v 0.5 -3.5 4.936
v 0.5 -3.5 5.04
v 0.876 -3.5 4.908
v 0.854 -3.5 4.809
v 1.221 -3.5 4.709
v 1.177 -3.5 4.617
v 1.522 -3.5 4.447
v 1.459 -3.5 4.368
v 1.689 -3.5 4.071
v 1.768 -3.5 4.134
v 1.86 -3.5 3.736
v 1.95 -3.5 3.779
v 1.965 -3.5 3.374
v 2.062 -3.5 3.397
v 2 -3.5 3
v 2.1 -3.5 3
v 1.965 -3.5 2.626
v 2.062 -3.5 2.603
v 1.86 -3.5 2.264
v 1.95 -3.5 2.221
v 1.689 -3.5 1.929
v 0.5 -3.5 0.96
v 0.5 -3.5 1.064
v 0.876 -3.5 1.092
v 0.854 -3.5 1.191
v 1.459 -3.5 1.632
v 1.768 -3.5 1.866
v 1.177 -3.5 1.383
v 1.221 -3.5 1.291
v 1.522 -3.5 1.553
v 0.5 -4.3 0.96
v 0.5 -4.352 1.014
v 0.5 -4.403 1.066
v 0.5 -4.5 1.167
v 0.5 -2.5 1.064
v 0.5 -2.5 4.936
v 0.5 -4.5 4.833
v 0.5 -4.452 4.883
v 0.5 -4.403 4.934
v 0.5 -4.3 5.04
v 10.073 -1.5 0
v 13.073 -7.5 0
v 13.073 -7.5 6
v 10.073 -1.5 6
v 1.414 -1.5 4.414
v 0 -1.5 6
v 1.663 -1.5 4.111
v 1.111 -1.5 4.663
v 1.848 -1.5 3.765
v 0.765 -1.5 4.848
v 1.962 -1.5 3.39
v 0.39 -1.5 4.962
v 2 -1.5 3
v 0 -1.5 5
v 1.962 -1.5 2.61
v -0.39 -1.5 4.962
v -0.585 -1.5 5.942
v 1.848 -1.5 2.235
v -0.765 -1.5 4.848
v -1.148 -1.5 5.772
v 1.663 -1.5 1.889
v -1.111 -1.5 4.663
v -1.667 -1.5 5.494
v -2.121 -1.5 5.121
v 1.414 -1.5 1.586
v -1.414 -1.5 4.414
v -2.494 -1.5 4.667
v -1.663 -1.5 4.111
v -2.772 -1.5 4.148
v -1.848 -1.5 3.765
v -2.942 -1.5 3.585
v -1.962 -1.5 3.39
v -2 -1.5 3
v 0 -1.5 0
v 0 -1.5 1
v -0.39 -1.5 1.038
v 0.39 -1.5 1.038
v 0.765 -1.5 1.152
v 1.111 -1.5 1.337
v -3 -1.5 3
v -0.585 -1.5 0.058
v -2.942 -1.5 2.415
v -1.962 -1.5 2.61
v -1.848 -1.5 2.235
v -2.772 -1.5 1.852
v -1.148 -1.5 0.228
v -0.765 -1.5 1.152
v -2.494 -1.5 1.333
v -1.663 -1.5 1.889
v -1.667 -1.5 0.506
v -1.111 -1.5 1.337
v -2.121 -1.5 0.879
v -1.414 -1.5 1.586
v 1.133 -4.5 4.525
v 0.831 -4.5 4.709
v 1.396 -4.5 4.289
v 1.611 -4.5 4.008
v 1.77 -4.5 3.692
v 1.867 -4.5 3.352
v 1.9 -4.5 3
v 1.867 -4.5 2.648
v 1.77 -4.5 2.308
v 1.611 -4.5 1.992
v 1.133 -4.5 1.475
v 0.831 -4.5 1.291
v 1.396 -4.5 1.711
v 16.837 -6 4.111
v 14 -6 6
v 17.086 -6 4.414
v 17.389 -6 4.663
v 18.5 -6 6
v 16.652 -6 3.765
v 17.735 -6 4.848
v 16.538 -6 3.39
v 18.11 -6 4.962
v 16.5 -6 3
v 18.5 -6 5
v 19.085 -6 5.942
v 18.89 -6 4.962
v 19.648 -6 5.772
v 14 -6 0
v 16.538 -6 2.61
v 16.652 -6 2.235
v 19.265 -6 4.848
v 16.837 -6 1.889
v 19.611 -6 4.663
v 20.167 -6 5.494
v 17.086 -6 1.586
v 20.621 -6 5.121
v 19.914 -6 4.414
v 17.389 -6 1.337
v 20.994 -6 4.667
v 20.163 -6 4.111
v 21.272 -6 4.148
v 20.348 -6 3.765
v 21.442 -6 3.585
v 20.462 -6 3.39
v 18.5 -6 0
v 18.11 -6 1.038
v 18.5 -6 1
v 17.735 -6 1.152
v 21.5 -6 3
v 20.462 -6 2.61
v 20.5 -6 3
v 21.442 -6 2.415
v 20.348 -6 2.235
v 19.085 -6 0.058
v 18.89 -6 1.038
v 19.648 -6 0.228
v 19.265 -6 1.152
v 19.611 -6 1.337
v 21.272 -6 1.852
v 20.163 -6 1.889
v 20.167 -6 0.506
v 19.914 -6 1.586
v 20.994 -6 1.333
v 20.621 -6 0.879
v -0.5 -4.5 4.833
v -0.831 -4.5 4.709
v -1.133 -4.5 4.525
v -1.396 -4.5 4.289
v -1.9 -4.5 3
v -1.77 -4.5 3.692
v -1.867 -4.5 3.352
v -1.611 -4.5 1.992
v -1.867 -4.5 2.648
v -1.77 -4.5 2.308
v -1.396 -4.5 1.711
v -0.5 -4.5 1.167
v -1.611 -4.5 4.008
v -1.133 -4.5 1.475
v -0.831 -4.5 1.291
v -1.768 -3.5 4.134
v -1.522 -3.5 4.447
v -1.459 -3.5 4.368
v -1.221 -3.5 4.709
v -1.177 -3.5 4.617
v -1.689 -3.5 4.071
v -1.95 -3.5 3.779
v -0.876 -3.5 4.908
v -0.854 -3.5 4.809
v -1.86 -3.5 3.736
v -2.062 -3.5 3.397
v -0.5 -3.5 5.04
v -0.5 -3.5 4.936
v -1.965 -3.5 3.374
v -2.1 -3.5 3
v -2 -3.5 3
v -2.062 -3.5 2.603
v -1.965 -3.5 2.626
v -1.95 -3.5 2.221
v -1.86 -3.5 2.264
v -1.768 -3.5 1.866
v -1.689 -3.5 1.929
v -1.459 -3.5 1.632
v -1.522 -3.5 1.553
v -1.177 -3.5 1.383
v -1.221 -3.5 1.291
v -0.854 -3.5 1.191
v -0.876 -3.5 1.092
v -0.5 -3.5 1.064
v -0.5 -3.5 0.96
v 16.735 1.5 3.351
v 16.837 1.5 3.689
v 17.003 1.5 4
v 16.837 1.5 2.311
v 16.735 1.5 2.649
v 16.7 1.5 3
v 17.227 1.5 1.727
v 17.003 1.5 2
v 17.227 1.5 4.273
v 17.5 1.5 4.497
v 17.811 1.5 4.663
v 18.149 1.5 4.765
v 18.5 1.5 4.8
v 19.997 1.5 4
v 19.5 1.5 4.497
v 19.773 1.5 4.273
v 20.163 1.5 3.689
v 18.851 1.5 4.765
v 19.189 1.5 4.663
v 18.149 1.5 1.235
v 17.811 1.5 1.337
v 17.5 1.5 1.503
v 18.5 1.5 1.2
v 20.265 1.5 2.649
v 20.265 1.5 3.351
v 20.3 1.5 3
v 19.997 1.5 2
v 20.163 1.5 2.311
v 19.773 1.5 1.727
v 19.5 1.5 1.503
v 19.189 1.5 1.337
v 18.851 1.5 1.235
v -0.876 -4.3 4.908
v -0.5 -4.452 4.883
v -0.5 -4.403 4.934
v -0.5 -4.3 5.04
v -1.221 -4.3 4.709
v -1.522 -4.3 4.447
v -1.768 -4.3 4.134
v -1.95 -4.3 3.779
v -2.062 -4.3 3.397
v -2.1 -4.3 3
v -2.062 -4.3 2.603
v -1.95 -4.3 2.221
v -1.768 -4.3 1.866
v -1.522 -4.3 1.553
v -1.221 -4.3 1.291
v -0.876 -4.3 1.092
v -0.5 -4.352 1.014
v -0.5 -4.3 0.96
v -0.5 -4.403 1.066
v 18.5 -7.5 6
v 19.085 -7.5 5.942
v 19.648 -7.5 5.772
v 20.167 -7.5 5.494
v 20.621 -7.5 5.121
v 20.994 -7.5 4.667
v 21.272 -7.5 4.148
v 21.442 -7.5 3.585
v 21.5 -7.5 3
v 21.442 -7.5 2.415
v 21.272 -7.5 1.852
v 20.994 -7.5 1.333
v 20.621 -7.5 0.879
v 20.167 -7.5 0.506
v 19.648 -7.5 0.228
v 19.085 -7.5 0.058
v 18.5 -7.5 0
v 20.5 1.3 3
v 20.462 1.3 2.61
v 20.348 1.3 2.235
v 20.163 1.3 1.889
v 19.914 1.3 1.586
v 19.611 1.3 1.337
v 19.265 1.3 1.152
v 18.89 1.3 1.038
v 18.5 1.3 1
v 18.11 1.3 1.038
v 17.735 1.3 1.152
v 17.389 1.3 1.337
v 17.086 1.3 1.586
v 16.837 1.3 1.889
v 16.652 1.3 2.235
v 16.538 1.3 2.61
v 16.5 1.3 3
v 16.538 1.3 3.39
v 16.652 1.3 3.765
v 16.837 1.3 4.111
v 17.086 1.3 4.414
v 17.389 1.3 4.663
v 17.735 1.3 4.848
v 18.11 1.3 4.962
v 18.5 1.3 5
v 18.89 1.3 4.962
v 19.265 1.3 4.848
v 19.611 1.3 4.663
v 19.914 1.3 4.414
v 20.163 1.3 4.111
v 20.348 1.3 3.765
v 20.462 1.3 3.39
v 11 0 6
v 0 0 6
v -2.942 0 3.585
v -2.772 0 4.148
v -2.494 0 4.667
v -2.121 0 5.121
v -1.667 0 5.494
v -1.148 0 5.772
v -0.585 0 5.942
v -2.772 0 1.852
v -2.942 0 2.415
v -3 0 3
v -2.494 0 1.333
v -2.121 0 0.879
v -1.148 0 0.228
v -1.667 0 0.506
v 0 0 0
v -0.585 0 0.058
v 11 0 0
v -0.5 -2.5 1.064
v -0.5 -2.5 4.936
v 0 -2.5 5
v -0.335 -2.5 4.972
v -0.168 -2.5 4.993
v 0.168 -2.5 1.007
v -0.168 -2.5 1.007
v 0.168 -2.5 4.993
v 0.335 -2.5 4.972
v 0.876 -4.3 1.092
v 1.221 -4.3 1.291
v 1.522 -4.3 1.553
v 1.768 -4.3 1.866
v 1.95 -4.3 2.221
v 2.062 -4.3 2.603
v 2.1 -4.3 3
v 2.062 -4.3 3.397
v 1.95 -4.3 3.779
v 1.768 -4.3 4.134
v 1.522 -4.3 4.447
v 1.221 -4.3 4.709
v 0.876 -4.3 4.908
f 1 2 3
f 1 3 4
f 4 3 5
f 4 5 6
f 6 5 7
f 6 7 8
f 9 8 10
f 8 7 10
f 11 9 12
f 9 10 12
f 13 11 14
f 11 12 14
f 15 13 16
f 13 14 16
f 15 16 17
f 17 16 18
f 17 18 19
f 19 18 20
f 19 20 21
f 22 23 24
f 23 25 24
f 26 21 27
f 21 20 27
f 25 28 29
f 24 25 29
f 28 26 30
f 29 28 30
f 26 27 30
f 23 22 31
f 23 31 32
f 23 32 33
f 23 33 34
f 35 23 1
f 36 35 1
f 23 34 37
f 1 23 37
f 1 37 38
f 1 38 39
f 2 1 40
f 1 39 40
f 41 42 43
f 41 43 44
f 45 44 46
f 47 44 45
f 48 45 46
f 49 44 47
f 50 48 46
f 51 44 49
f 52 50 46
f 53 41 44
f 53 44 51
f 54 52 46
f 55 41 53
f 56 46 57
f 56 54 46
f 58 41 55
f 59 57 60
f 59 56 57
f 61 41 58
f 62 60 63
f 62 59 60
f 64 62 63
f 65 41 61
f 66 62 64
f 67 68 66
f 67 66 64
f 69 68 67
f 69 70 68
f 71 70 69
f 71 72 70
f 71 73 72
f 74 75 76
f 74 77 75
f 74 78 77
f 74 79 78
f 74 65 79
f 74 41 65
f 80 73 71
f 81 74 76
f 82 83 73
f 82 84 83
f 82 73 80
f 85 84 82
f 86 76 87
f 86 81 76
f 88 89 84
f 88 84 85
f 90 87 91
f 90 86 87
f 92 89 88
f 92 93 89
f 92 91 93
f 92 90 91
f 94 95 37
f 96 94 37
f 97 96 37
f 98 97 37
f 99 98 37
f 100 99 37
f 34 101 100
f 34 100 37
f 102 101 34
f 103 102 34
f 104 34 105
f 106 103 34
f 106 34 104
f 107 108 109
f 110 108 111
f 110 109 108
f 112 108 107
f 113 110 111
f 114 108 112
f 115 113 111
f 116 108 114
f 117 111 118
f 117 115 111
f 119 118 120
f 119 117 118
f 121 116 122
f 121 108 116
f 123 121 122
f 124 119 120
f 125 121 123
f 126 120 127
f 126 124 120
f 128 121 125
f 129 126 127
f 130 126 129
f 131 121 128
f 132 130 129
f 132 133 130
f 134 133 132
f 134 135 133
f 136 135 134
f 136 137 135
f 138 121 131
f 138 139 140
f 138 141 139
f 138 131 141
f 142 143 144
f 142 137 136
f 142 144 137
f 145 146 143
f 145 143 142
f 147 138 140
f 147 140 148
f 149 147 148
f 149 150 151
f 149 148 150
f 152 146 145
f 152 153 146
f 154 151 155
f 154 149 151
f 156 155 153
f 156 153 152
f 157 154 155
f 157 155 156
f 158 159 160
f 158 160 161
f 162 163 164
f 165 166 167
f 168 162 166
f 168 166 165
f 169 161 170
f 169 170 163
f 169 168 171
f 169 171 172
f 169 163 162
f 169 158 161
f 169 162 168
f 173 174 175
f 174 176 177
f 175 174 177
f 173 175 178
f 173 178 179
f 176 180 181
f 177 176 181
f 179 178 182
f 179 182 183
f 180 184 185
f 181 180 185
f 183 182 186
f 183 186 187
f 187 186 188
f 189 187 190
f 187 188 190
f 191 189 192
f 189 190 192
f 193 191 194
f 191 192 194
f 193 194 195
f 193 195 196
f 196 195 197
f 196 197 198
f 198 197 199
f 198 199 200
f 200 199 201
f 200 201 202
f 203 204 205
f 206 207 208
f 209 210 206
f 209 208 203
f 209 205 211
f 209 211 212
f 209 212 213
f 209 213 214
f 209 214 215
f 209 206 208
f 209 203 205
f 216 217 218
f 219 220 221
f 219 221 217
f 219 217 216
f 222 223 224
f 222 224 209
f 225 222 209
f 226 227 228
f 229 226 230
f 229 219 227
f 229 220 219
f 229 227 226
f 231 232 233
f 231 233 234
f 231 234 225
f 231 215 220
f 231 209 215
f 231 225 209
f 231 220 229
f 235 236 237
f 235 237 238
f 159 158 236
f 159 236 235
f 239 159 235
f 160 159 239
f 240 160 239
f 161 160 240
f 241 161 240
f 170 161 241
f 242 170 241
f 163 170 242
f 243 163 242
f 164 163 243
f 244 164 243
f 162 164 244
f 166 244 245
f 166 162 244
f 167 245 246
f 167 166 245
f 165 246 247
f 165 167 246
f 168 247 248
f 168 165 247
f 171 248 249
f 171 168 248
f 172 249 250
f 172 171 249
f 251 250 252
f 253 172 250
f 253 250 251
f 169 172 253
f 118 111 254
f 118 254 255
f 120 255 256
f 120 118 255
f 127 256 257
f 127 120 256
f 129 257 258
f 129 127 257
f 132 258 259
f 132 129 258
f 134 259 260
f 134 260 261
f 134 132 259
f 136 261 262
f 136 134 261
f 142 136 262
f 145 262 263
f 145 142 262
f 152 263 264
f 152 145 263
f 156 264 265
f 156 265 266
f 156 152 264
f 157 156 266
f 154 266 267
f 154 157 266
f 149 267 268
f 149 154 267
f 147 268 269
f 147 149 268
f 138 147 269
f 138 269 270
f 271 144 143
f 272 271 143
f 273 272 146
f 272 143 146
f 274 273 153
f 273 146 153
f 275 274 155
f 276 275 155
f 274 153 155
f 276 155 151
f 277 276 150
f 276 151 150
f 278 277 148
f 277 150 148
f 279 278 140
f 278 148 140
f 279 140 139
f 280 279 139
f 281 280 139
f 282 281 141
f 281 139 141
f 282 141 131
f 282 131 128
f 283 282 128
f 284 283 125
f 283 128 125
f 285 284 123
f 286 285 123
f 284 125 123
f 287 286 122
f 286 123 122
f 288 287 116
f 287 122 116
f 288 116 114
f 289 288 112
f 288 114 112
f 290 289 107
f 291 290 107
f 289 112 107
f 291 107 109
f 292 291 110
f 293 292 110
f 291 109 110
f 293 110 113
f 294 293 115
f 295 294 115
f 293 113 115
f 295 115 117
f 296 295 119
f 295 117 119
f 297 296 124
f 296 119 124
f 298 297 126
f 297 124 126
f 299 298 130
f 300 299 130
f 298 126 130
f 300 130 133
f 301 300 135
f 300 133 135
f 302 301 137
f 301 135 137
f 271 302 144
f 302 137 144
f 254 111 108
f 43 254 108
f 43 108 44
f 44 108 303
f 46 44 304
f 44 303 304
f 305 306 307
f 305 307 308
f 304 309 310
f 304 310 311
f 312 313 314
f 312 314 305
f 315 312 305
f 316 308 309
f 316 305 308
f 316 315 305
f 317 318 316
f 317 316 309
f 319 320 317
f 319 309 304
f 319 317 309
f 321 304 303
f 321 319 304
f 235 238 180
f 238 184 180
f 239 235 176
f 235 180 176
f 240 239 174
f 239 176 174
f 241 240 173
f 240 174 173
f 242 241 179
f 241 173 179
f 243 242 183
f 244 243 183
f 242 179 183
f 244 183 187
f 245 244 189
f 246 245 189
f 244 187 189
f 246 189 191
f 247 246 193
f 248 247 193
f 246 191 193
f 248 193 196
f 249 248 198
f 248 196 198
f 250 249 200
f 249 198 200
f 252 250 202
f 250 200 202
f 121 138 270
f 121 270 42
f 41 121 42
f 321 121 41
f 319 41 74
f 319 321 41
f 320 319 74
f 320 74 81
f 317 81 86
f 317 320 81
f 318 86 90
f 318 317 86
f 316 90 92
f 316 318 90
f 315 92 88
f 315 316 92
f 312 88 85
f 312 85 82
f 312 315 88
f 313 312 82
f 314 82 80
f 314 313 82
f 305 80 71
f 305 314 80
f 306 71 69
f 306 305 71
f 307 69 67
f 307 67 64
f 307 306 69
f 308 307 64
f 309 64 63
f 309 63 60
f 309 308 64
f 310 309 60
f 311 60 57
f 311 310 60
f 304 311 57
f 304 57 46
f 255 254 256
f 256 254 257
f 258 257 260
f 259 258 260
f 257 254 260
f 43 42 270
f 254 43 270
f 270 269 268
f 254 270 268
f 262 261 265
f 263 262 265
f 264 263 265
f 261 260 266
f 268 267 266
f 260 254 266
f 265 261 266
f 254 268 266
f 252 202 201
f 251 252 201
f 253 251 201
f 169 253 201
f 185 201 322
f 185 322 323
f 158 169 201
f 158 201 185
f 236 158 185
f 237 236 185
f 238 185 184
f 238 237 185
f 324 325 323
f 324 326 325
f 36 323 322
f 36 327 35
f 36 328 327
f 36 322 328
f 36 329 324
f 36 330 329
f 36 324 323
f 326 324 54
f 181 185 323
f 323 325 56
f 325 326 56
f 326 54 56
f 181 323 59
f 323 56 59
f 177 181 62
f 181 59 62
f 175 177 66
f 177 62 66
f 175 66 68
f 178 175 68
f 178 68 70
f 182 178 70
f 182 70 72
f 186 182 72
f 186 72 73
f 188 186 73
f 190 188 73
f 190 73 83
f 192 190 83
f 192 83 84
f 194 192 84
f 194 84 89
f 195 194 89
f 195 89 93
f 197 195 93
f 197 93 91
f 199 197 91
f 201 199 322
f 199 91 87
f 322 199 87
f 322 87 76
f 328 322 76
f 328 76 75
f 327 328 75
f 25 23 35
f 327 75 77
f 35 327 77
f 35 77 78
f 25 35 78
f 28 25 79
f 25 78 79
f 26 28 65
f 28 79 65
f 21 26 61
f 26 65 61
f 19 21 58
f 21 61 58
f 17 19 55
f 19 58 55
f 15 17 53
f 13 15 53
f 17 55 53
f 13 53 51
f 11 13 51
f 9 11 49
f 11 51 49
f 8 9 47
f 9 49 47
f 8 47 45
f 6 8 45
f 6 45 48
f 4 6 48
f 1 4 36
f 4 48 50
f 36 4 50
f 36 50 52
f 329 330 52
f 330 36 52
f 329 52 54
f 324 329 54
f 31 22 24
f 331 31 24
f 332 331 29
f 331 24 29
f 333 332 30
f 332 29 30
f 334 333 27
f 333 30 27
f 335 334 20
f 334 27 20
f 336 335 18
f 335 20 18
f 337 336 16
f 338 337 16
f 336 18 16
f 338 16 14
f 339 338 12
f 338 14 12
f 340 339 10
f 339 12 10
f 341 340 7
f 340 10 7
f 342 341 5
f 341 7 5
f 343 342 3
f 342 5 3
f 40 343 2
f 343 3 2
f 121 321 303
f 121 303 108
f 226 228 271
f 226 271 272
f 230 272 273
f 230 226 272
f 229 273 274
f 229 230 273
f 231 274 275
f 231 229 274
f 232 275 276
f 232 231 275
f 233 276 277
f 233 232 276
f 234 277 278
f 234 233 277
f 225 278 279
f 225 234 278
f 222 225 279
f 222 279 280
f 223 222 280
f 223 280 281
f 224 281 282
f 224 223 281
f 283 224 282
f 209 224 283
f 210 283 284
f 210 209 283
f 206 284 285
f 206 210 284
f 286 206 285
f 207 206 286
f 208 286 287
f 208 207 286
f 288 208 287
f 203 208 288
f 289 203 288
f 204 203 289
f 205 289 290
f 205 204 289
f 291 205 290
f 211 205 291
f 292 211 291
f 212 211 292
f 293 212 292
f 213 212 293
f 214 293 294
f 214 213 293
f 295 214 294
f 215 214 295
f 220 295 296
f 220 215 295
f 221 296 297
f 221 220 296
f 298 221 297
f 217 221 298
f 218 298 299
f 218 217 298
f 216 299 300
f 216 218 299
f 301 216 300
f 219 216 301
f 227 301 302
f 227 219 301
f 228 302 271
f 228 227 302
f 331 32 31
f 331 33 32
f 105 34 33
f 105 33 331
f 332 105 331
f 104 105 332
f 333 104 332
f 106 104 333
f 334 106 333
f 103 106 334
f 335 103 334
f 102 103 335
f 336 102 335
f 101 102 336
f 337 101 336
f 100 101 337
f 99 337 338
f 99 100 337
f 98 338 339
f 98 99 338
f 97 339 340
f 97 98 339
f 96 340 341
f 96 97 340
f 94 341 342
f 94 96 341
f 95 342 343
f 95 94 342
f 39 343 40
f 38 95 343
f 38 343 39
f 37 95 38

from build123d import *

# Parameters (mm, degrees)
EXTRUDE_1_DEPTH     = 6
SKETCH_2_R          = 3
EXTRUDE_2_DEPTH     = 1.5
SKETCH_3_R          = 3
EXTRUDE_3_DEPTH     = 1.5
SKETCH_4_R          = 2
EXTRUDE_4_DEPTH     = 2
SKETCH_5_R          = 2.1
EXTRUDE_5_DEPTH     = 1
CHAMFER_1_SIZE      = 0.2
SKETCH_6_W          = 1
SKETCH_6_H          = 5
CUT_EXTRUDE_1_DEPTH = 2
SKETCH_7_R          = 2
EXTRUDE_6_DEPTH     = 7.5
CHAMFER_2_SIZE      = 0.2


with BuildPart() as part:
    # 草图1 → 凸台-拉伸1 (new body)
    with BuildSketch(Plane.XY):
        Polygon((0, 0), (11, 0), (14, -6), (18.5, -6), (18.5, -7.5), (13.072949017, -7.5), (10.072949017, -1.5), (0, -1.5), align=None)
    extrude(amount=EXTRUDE_1_DEPTH)

    # 草图2 → 凸台-拉伸2 (add)
    with BuildSketch(Plane(origin=(0, 0, 0), x_dir=(1, 0, 0), z_dir=(0, 1, 0))):
        with Locations((0, -3)):
            Circle(SKETCH_2_R)
    extrude(amount=-EXTRUDE_2_DEPTH)

    # 草图3 → 凸台-拉伸3 (add)
    with BuildSketch(Plane(origin=(0, -6, 0), x_dir=(1, 0, 0), z_dir=(0, 1, 0))):
        with Locations((18.5, -3)):
            Circle(SKETCH_3_R)
    extrude(amount=-EXTRUDE_3_DEPTH)

    # 草图4 → 凸台-拉伸4 (add)
    with BuildSketch(Plane.XZ.offset(1.5)):
        with Locations(Location((0, 3, 0), (0, 0, 90))):
            Circle(SKETCH_4_R)
    extrude(amount=EXTRUDE_4_DEPTH)

    # 草图5 → 凸台-拉伸5 (add)
    with BuildSketch(Plane.XZ.offset(3.5)):
        with Locations(Location((0, 3, 0), (0, 0, 270))):
            Circle(SKETCH_5_R)
    extrude(amount=EXTRUDE_5_DEPTH)

    # 倒角1
    chamfer_1_edges = [part.edges().sort_by_distance(p)[0] for p in [
        (0, -4.5, 5.1),
    ]]
    chamfer(chamfer_1_edges, length=CHAMFER_1_SIZE)

    # 草图6 → 切除-拉伸1 (cut)
    with BuildSketch(Plane.XZ.offset(4.5)):
        with Locations((0, 3)):
            Rectangle(SKETCH_6_W, SKETCH_6_H)
    extrude(amount=-CUT_EXTRUDE_1_DEPTH, mode=Mode.SUBTRACT)

    # 草图7 → 凸台-拉伸6 (add)
    with BuildSketch(Plane(origin=(0, -6, 0), x_dir=(1, 0, 0), z_dir=(0, 1, 0))):
        with Locations((18.5, -3)):
            Circle(SKETCH_7_R)
    extrude(amount=EXTRUDE_6_DEPTH)

    # 倒角2
    chamfer_2_edges = [part.edges().sort_by_distance(p)[0] for p in [
        (16.5, 1.5, 3),
    ]]
    chamfer(chamfer_2_edges, length=CHAMFER_2_SIZE)


solid = part.part
